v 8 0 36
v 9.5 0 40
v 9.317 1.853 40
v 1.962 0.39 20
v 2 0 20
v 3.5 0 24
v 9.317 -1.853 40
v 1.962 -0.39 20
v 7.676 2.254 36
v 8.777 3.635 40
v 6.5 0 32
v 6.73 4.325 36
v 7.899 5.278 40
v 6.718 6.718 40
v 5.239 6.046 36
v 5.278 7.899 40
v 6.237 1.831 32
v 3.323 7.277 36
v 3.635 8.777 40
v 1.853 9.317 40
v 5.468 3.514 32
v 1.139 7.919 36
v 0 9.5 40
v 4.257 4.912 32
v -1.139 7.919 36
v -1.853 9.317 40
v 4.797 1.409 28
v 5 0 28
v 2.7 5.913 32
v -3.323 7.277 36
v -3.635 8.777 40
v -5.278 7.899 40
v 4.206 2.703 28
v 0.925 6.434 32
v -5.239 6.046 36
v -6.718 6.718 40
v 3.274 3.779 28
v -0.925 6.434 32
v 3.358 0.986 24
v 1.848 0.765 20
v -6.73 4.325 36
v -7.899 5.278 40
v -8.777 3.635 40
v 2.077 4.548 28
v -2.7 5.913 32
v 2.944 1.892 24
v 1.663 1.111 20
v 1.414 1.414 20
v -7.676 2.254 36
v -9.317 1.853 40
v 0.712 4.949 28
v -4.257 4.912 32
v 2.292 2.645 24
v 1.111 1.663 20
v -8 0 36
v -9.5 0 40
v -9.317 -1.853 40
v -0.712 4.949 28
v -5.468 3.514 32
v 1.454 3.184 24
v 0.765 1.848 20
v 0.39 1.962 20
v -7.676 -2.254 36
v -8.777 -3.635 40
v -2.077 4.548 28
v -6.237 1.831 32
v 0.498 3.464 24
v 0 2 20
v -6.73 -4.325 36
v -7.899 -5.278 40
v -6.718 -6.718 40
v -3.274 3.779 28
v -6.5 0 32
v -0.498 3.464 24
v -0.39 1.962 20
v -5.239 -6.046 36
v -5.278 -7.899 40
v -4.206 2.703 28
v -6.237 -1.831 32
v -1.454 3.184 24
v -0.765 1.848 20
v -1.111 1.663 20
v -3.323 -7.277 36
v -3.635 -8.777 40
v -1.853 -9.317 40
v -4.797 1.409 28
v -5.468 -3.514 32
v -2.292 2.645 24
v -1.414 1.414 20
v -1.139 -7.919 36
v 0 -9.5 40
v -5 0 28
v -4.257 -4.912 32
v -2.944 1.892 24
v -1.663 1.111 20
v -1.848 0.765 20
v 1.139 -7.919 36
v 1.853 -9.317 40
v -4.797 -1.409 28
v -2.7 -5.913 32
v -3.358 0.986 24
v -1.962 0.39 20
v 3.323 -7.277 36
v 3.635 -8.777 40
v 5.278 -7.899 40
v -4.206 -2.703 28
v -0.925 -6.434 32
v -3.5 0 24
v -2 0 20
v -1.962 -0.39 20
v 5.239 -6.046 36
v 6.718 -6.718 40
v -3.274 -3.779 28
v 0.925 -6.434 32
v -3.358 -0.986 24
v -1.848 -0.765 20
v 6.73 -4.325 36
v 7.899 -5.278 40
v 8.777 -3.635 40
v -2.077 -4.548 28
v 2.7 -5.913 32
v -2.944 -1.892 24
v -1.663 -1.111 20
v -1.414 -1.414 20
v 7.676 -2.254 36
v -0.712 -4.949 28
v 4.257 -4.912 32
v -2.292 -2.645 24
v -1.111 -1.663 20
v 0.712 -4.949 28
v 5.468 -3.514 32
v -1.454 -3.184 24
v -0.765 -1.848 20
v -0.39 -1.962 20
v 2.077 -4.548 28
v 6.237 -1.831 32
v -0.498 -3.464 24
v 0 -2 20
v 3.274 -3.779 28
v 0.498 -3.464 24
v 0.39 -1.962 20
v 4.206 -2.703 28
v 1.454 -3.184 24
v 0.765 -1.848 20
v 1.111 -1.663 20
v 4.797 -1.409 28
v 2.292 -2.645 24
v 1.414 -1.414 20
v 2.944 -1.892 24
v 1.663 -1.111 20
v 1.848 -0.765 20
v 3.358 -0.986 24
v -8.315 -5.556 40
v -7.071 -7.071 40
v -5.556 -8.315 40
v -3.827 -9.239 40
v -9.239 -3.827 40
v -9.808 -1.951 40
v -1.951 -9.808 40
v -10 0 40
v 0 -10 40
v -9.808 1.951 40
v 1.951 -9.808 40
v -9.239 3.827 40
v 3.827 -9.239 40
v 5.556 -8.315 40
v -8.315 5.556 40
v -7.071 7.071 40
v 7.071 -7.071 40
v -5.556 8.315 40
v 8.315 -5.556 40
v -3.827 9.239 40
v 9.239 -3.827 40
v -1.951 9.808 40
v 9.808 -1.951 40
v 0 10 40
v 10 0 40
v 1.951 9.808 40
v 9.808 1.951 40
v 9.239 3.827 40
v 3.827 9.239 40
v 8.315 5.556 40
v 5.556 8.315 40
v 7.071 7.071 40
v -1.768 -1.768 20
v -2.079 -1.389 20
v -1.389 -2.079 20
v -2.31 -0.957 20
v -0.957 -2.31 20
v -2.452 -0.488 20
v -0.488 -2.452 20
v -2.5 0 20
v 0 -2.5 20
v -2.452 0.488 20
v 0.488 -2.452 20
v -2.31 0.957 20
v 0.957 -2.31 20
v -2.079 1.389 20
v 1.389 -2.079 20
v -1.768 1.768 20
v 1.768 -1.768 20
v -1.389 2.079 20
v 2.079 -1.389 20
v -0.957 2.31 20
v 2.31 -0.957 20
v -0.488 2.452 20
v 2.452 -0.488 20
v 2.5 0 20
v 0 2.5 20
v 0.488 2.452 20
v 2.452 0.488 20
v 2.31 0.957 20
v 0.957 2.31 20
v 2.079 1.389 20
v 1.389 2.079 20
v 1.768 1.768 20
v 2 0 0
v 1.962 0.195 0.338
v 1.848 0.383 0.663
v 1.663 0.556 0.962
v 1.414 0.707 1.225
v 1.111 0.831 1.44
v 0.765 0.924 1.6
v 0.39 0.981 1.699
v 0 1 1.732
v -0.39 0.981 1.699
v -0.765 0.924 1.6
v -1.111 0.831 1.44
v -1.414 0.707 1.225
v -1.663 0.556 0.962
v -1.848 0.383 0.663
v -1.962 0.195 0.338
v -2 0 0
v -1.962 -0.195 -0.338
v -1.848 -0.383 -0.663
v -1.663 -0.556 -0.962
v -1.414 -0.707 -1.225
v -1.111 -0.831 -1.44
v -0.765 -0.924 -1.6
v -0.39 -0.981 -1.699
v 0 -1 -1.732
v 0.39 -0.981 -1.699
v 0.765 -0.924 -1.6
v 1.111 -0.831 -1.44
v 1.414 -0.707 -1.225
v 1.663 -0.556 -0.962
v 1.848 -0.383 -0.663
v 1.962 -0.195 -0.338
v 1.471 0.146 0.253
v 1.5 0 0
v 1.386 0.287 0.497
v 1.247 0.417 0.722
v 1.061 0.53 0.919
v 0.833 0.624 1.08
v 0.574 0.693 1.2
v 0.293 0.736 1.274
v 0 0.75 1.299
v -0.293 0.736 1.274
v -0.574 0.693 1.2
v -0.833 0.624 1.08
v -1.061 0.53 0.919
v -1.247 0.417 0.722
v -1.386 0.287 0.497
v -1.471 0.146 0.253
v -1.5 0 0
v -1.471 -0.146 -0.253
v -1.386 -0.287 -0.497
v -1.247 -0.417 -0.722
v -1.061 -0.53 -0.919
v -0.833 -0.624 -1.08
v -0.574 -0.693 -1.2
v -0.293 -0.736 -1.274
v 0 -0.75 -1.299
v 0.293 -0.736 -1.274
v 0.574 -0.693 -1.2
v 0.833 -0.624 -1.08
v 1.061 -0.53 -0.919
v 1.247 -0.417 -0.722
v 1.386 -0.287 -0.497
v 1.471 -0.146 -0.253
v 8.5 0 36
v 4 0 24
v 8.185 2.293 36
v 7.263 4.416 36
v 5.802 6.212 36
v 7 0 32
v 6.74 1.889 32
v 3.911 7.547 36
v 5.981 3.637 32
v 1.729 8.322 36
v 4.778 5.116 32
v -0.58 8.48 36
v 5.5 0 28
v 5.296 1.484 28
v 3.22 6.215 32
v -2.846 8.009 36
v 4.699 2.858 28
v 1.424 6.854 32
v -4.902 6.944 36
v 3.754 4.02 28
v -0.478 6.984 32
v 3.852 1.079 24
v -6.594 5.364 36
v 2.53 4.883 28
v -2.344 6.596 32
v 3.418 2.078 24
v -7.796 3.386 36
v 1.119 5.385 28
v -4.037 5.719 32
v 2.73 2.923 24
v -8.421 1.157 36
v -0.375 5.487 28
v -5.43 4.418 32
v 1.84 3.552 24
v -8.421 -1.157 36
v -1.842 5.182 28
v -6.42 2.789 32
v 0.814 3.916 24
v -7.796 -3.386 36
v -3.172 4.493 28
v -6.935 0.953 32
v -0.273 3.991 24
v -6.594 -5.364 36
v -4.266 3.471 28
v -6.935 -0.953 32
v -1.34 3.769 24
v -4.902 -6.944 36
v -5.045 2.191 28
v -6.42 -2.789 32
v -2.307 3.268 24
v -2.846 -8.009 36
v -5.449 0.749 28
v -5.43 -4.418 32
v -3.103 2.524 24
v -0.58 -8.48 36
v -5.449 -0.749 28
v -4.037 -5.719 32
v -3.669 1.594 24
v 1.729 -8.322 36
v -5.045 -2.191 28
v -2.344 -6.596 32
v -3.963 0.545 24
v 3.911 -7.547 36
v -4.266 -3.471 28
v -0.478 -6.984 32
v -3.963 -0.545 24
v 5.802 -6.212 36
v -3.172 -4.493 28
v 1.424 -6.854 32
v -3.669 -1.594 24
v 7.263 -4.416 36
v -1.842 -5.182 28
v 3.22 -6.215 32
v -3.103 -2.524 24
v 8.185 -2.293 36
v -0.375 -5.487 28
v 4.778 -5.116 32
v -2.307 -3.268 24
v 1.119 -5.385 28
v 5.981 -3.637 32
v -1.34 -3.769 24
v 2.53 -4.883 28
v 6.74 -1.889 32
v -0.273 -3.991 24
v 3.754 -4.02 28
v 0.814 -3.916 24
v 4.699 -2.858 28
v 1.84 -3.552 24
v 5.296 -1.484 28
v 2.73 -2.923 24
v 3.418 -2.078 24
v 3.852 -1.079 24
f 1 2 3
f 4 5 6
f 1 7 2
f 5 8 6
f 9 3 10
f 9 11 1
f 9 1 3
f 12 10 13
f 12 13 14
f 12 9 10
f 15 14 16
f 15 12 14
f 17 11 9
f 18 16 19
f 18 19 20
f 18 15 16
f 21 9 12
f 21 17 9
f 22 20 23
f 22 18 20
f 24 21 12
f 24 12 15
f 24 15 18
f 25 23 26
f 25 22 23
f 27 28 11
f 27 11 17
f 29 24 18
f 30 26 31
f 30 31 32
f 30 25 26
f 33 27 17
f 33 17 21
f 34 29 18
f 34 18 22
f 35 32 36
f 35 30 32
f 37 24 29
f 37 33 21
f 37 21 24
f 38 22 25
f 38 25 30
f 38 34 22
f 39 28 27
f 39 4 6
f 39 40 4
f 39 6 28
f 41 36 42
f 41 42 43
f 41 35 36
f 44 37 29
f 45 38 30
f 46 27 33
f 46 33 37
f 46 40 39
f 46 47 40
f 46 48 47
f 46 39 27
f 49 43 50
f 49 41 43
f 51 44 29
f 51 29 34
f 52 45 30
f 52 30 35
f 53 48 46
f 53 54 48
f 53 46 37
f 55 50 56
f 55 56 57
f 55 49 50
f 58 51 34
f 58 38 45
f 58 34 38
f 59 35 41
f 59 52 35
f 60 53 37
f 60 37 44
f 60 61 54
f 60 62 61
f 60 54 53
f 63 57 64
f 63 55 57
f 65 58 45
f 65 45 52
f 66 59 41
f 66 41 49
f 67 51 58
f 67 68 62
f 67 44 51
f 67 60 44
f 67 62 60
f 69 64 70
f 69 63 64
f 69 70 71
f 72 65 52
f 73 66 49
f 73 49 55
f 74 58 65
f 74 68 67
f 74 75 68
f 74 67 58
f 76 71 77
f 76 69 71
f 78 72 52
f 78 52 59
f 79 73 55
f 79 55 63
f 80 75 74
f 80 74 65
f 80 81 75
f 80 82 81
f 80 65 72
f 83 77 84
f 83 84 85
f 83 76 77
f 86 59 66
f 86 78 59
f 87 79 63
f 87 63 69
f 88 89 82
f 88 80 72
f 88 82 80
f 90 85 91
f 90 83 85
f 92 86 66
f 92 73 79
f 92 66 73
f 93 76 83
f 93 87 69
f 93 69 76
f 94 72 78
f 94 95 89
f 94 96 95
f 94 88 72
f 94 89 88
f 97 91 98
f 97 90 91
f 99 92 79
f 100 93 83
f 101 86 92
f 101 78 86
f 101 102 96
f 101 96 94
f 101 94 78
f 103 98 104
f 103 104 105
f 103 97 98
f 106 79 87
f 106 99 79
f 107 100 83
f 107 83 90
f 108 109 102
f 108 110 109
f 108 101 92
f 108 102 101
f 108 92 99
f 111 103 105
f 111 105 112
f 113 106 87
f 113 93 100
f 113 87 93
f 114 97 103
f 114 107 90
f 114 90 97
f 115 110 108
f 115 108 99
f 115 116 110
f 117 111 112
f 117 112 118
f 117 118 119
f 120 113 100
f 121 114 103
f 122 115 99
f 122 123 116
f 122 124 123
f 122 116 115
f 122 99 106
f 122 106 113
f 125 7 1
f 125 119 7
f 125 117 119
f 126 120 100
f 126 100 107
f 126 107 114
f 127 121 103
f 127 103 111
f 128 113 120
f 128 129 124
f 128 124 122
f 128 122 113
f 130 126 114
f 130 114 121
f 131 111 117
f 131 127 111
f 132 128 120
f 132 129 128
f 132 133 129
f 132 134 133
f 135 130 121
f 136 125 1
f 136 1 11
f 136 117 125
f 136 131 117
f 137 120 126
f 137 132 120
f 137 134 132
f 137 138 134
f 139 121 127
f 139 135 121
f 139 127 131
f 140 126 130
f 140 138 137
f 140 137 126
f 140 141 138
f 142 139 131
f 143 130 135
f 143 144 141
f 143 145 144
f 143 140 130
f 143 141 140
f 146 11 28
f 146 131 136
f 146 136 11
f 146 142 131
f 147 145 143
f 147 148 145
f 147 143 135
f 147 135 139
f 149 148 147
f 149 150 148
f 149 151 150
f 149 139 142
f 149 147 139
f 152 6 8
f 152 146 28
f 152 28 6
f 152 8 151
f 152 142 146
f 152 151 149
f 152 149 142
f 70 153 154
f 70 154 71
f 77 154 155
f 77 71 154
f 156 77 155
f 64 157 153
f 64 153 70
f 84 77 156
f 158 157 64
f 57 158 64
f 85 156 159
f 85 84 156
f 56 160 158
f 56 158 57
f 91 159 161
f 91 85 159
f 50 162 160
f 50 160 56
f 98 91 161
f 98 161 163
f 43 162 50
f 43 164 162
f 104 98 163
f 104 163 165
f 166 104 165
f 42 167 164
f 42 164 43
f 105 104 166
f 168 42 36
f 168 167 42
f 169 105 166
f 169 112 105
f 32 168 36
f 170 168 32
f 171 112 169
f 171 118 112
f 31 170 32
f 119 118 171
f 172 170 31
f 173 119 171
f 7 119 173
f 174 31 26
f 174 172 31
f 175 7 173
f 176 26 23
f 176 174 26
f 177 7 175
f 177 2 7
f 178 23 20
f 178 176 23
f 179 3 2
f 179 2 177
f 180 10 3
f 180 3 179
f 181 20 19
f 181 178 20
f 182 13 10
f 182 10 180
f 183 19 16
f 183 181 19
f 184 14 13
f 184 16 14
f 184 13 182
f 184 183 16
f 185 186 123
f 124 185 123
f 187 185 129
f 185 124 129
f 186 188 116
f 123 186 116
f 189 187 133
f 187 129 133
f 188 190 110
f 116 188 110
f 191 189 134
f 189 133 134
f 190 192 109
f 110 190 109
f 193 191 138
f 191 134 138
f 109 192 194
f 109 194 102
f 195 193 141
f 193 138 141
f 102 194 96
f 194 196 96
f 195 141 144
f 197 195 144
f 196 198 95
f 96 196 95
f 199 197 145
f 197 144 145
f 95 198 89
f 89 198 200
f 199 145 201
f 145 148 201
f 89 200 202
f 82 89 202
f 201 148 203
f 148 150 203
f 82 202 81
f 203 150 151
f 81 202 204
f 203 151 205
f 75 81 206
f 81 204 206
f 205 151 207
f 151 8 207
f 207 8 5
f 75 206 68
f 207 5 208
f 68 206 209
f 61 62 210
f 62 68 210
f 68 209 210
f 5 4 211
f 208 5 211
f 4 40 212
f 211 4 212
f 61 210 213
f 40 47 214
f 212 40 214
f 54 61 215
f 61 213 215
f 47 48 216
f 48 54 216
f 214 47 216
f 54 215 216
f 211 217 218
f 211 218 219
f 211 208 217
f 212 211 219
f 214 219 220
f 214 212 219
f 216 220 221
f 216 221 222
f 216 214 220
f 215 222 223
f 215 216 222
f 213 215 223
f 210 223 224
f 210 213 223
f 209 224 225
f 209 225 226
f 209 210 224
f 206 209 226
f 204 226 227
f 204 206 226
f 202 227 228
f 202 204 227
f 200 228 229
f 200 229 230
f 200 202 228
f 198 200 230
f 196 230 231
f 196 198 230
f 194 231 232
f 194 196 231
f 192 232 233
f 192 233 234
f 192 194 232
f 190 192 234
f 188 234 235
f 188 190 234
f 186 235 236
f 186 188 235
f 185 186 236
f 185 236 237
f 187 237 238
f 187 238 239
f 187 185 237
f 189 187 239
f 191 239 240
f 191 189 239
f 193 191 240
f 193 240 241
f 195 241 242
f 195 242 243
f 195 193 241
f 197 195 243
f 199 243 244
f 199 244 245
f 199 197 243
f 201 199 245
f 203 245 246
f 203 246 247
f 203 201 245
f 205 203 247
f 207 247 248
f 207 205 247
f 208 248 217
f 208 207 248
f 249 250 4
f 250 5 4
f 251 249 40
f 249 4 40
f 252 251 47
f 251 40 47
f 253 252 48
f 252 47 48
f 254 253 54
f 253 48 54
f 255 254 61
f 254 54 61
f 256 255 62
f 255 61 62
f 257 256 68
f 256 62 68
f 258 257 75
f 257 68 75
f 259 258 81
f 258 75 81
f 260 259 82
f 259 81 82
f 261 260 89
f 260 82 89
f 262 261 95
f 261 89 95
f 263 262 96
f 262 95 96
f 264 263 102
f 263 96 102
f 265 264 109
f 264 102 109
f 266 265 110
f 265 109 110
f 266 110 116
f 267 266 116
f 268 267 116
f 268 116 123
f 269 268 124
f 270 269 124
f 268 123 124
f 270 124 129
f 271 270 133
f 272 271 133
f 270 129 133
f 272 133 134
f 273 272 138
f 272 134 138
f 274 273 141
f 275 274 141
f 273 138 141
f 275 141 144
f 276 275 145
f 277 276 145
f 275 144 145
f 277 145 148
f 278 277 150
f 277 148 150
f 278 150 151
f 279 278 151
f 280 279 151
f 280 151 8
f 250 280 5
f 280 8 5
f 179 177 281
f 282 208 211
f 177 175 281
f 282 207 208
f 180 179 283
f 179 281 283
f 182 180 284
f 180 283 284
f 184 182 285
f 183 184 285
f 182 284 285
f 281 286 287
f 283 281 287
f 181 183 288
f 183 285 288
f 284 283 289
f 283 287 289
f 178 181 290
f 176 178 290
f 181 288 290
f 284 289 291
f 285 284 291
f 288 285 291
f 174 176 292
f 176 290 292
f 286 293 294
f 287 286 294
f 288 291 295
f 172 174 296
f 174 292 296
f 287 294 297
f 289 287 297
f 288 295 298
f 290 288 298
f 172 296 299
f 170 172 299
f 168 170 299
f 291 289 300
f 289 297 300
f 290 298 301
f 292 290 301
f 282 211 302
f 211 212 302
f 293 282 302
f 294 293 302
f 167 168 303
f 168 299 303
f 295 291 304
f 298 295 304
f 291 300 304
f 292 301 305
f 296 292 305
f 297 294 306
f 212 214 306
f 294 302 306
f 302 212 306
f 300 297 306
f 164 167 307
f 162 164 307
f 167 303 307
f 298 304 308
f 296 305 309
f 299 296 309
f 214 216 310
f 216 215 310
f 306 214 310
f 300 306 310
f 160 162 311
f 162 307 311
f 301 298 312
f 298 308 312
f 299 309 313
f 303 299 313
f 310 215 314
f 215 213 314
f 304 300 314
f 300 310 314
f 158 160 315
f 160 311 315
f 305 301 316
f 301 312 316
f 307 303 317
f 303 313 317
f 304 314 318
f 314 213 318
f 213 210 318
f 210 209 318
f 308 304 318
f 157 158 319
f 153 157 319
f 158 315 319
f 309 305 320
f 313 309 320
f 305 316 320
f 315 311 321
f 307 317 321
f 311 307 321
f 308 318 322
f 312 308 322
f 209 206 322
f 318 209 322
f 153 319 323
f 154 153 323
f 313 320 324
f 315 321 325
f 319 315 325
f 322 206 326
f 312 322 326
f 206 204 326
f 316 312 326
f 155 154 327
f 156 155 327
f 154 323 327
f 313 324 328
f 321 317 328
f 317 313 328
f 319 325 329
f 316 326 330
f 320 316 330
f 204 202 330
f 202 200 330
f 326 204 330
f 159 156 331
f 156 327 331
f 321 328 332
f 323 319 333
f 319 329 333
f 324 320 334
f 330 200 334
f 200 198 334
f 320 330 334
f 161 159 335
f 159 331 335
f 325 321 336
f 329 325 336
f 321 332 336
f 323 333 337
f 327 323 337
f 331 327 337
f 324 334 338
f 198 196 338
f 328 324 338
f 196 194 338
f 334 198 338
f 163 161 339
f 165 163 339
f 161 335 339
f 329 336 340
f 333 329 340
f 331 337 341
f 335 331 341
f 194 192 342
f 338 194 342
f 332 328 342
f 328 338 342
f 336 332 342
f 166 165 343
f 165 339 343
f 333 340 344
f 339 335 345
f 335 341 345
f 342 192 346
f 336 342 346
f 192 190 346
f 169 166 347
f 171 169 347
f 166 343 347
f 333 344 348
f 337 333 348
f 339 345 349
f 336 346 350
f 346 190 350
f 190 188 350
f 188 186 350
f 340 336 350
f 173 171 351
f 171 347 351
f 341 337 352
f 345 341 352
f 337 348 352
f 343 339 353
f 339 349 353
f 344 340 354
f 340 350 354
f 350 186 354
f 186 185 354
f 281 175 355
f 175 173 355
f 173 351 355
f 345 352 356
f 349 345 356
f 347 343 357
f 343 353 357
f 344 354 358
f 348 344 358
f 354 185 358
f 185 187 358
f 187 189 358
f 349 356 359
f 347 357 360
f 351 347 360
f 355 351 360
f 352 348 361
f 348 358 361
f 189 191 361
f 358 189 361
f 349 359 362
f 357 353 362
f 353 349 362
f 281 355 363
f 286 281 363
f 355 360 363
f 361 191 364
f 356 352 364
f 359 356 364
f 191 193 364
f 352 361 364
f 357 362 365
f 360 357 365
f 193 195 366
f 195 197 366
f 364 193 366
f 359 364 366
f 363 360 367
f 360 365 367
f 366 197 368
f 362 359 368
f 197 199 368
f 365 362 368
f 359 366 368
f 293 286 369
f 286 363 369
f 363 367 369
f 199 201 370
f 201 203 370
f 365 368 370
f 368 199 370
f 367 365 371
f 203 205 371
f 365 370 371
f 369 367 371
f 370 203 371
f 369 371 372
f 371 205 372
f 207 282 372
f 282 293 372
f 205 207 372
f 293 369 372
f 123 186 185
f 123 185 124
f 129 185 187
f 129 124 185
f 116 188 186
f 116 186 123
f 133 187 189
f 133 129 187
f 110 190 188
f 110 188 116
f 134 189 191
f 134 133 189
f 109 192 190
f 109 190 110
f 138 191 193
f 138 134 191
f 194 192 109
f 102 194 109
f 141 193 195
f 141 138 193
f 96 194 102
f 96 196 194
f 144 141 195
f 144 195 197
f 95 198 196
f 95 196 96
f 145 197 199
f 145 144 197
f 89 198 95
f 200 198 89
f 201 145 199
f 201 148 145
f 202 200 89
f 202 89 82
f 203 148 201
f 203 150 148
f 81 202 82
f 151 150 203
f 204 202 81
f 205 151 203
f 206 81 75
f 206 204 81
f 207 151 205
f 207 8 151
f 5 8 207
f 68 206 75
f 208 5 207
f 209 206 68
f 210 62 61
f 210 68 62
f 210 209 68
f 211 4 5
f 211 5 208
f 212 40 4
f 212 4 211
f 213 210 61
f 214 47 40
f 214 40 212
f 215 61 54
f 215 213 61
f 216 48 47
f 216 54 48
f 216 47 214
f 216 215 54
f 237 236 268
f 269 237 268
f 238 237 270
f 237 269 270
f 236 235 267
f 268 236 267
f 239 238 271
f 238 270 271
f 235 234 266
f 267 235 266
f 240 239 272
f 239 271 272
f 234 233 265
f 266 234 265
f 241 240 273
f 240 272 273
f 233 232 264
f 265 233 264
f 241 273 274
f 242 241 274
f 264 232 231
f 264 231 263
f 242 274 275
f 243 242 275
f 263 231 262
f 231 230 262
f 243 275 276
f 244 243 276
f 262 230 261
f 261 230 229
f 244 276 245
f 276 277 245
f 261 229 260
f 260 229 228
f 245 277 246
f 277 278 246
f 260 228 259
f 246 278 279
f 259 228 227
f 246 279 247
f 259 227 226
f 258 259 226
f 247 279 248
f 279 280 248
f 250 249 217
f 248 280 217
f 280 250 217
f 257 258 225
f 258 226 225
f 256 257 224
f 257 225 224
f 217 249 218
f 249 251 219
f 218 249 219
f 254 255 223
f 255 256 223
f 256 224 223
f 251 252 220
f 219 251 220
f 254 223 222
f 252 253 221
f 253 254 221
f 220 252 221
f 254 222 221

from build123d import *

# Parameters (mm, degrees)
SKETCH002_R = 1.500011
SKETCH003_R = 2.000005
SKETCH_R    = 2
SKETCH001_R = 2.5
SKETCH005_R = 9.500009
SKETCH004_R = 10


with BuildPart() as loft_body:
    # Sketch002 → Loft section 0
    with BuildSketch(Plane(origin=(0, 0, 0), x_dir=(1, 0, 0), z_dir=(0, -0.866025, 0.5))):
        Circle(SKETCH002_R)
    # Sketch003 → Loft section 1
    with BuildSketch(Plane.XY.offset(20)):
        Circle(SKETCH003_R)
    loft()


with BuildPart() as cut:
    # Sketch → Loft001 section 0
    with BuildSketch(Plane(origin=(0, 0, 0), x_dir=(1, 0, 0), z_dir=(0, -0.866025, 0.5))):
        Circle(SKETCH_R)
    # Sketch001 → Loft001 section 1
    with BuildSketch(Plane.XY.offset(20)):
        Circle(SKETCH001_R)
    loft()

    # Cut: cut Loft body
    add(loft_body.part, mode=Mode.SUBTRACT)


with BuildPart() as loft003:
    # Sketch005 → Loft003 section 0
    with BuildSketch(Plane.XY.offset(40)):
        Circle(SKETCH005_R)
    # Sketch003 → Loft003 section 1
    with BuildSketch(Plane.XY.offset(20)):
        Circle(SKETCH003_R)
    loft()


with BuildPart() as cut001:
    # Sketch004 → Loft002 section 0
    with BuildSketch(Plane.XY.offset(40)):
        Circle(SKETCH004_R)
    # Sketch001 → Loft002 section 1
    with BuildSketch(Plane.XY.offset(20)):
        Circle(SKETCH001_R)
    loft()

    # Cut001: cut Loft003
    add(loft003.part, mode=Mode.SUBTRACT)


solid = Compound([cut.part, cut001.part])
